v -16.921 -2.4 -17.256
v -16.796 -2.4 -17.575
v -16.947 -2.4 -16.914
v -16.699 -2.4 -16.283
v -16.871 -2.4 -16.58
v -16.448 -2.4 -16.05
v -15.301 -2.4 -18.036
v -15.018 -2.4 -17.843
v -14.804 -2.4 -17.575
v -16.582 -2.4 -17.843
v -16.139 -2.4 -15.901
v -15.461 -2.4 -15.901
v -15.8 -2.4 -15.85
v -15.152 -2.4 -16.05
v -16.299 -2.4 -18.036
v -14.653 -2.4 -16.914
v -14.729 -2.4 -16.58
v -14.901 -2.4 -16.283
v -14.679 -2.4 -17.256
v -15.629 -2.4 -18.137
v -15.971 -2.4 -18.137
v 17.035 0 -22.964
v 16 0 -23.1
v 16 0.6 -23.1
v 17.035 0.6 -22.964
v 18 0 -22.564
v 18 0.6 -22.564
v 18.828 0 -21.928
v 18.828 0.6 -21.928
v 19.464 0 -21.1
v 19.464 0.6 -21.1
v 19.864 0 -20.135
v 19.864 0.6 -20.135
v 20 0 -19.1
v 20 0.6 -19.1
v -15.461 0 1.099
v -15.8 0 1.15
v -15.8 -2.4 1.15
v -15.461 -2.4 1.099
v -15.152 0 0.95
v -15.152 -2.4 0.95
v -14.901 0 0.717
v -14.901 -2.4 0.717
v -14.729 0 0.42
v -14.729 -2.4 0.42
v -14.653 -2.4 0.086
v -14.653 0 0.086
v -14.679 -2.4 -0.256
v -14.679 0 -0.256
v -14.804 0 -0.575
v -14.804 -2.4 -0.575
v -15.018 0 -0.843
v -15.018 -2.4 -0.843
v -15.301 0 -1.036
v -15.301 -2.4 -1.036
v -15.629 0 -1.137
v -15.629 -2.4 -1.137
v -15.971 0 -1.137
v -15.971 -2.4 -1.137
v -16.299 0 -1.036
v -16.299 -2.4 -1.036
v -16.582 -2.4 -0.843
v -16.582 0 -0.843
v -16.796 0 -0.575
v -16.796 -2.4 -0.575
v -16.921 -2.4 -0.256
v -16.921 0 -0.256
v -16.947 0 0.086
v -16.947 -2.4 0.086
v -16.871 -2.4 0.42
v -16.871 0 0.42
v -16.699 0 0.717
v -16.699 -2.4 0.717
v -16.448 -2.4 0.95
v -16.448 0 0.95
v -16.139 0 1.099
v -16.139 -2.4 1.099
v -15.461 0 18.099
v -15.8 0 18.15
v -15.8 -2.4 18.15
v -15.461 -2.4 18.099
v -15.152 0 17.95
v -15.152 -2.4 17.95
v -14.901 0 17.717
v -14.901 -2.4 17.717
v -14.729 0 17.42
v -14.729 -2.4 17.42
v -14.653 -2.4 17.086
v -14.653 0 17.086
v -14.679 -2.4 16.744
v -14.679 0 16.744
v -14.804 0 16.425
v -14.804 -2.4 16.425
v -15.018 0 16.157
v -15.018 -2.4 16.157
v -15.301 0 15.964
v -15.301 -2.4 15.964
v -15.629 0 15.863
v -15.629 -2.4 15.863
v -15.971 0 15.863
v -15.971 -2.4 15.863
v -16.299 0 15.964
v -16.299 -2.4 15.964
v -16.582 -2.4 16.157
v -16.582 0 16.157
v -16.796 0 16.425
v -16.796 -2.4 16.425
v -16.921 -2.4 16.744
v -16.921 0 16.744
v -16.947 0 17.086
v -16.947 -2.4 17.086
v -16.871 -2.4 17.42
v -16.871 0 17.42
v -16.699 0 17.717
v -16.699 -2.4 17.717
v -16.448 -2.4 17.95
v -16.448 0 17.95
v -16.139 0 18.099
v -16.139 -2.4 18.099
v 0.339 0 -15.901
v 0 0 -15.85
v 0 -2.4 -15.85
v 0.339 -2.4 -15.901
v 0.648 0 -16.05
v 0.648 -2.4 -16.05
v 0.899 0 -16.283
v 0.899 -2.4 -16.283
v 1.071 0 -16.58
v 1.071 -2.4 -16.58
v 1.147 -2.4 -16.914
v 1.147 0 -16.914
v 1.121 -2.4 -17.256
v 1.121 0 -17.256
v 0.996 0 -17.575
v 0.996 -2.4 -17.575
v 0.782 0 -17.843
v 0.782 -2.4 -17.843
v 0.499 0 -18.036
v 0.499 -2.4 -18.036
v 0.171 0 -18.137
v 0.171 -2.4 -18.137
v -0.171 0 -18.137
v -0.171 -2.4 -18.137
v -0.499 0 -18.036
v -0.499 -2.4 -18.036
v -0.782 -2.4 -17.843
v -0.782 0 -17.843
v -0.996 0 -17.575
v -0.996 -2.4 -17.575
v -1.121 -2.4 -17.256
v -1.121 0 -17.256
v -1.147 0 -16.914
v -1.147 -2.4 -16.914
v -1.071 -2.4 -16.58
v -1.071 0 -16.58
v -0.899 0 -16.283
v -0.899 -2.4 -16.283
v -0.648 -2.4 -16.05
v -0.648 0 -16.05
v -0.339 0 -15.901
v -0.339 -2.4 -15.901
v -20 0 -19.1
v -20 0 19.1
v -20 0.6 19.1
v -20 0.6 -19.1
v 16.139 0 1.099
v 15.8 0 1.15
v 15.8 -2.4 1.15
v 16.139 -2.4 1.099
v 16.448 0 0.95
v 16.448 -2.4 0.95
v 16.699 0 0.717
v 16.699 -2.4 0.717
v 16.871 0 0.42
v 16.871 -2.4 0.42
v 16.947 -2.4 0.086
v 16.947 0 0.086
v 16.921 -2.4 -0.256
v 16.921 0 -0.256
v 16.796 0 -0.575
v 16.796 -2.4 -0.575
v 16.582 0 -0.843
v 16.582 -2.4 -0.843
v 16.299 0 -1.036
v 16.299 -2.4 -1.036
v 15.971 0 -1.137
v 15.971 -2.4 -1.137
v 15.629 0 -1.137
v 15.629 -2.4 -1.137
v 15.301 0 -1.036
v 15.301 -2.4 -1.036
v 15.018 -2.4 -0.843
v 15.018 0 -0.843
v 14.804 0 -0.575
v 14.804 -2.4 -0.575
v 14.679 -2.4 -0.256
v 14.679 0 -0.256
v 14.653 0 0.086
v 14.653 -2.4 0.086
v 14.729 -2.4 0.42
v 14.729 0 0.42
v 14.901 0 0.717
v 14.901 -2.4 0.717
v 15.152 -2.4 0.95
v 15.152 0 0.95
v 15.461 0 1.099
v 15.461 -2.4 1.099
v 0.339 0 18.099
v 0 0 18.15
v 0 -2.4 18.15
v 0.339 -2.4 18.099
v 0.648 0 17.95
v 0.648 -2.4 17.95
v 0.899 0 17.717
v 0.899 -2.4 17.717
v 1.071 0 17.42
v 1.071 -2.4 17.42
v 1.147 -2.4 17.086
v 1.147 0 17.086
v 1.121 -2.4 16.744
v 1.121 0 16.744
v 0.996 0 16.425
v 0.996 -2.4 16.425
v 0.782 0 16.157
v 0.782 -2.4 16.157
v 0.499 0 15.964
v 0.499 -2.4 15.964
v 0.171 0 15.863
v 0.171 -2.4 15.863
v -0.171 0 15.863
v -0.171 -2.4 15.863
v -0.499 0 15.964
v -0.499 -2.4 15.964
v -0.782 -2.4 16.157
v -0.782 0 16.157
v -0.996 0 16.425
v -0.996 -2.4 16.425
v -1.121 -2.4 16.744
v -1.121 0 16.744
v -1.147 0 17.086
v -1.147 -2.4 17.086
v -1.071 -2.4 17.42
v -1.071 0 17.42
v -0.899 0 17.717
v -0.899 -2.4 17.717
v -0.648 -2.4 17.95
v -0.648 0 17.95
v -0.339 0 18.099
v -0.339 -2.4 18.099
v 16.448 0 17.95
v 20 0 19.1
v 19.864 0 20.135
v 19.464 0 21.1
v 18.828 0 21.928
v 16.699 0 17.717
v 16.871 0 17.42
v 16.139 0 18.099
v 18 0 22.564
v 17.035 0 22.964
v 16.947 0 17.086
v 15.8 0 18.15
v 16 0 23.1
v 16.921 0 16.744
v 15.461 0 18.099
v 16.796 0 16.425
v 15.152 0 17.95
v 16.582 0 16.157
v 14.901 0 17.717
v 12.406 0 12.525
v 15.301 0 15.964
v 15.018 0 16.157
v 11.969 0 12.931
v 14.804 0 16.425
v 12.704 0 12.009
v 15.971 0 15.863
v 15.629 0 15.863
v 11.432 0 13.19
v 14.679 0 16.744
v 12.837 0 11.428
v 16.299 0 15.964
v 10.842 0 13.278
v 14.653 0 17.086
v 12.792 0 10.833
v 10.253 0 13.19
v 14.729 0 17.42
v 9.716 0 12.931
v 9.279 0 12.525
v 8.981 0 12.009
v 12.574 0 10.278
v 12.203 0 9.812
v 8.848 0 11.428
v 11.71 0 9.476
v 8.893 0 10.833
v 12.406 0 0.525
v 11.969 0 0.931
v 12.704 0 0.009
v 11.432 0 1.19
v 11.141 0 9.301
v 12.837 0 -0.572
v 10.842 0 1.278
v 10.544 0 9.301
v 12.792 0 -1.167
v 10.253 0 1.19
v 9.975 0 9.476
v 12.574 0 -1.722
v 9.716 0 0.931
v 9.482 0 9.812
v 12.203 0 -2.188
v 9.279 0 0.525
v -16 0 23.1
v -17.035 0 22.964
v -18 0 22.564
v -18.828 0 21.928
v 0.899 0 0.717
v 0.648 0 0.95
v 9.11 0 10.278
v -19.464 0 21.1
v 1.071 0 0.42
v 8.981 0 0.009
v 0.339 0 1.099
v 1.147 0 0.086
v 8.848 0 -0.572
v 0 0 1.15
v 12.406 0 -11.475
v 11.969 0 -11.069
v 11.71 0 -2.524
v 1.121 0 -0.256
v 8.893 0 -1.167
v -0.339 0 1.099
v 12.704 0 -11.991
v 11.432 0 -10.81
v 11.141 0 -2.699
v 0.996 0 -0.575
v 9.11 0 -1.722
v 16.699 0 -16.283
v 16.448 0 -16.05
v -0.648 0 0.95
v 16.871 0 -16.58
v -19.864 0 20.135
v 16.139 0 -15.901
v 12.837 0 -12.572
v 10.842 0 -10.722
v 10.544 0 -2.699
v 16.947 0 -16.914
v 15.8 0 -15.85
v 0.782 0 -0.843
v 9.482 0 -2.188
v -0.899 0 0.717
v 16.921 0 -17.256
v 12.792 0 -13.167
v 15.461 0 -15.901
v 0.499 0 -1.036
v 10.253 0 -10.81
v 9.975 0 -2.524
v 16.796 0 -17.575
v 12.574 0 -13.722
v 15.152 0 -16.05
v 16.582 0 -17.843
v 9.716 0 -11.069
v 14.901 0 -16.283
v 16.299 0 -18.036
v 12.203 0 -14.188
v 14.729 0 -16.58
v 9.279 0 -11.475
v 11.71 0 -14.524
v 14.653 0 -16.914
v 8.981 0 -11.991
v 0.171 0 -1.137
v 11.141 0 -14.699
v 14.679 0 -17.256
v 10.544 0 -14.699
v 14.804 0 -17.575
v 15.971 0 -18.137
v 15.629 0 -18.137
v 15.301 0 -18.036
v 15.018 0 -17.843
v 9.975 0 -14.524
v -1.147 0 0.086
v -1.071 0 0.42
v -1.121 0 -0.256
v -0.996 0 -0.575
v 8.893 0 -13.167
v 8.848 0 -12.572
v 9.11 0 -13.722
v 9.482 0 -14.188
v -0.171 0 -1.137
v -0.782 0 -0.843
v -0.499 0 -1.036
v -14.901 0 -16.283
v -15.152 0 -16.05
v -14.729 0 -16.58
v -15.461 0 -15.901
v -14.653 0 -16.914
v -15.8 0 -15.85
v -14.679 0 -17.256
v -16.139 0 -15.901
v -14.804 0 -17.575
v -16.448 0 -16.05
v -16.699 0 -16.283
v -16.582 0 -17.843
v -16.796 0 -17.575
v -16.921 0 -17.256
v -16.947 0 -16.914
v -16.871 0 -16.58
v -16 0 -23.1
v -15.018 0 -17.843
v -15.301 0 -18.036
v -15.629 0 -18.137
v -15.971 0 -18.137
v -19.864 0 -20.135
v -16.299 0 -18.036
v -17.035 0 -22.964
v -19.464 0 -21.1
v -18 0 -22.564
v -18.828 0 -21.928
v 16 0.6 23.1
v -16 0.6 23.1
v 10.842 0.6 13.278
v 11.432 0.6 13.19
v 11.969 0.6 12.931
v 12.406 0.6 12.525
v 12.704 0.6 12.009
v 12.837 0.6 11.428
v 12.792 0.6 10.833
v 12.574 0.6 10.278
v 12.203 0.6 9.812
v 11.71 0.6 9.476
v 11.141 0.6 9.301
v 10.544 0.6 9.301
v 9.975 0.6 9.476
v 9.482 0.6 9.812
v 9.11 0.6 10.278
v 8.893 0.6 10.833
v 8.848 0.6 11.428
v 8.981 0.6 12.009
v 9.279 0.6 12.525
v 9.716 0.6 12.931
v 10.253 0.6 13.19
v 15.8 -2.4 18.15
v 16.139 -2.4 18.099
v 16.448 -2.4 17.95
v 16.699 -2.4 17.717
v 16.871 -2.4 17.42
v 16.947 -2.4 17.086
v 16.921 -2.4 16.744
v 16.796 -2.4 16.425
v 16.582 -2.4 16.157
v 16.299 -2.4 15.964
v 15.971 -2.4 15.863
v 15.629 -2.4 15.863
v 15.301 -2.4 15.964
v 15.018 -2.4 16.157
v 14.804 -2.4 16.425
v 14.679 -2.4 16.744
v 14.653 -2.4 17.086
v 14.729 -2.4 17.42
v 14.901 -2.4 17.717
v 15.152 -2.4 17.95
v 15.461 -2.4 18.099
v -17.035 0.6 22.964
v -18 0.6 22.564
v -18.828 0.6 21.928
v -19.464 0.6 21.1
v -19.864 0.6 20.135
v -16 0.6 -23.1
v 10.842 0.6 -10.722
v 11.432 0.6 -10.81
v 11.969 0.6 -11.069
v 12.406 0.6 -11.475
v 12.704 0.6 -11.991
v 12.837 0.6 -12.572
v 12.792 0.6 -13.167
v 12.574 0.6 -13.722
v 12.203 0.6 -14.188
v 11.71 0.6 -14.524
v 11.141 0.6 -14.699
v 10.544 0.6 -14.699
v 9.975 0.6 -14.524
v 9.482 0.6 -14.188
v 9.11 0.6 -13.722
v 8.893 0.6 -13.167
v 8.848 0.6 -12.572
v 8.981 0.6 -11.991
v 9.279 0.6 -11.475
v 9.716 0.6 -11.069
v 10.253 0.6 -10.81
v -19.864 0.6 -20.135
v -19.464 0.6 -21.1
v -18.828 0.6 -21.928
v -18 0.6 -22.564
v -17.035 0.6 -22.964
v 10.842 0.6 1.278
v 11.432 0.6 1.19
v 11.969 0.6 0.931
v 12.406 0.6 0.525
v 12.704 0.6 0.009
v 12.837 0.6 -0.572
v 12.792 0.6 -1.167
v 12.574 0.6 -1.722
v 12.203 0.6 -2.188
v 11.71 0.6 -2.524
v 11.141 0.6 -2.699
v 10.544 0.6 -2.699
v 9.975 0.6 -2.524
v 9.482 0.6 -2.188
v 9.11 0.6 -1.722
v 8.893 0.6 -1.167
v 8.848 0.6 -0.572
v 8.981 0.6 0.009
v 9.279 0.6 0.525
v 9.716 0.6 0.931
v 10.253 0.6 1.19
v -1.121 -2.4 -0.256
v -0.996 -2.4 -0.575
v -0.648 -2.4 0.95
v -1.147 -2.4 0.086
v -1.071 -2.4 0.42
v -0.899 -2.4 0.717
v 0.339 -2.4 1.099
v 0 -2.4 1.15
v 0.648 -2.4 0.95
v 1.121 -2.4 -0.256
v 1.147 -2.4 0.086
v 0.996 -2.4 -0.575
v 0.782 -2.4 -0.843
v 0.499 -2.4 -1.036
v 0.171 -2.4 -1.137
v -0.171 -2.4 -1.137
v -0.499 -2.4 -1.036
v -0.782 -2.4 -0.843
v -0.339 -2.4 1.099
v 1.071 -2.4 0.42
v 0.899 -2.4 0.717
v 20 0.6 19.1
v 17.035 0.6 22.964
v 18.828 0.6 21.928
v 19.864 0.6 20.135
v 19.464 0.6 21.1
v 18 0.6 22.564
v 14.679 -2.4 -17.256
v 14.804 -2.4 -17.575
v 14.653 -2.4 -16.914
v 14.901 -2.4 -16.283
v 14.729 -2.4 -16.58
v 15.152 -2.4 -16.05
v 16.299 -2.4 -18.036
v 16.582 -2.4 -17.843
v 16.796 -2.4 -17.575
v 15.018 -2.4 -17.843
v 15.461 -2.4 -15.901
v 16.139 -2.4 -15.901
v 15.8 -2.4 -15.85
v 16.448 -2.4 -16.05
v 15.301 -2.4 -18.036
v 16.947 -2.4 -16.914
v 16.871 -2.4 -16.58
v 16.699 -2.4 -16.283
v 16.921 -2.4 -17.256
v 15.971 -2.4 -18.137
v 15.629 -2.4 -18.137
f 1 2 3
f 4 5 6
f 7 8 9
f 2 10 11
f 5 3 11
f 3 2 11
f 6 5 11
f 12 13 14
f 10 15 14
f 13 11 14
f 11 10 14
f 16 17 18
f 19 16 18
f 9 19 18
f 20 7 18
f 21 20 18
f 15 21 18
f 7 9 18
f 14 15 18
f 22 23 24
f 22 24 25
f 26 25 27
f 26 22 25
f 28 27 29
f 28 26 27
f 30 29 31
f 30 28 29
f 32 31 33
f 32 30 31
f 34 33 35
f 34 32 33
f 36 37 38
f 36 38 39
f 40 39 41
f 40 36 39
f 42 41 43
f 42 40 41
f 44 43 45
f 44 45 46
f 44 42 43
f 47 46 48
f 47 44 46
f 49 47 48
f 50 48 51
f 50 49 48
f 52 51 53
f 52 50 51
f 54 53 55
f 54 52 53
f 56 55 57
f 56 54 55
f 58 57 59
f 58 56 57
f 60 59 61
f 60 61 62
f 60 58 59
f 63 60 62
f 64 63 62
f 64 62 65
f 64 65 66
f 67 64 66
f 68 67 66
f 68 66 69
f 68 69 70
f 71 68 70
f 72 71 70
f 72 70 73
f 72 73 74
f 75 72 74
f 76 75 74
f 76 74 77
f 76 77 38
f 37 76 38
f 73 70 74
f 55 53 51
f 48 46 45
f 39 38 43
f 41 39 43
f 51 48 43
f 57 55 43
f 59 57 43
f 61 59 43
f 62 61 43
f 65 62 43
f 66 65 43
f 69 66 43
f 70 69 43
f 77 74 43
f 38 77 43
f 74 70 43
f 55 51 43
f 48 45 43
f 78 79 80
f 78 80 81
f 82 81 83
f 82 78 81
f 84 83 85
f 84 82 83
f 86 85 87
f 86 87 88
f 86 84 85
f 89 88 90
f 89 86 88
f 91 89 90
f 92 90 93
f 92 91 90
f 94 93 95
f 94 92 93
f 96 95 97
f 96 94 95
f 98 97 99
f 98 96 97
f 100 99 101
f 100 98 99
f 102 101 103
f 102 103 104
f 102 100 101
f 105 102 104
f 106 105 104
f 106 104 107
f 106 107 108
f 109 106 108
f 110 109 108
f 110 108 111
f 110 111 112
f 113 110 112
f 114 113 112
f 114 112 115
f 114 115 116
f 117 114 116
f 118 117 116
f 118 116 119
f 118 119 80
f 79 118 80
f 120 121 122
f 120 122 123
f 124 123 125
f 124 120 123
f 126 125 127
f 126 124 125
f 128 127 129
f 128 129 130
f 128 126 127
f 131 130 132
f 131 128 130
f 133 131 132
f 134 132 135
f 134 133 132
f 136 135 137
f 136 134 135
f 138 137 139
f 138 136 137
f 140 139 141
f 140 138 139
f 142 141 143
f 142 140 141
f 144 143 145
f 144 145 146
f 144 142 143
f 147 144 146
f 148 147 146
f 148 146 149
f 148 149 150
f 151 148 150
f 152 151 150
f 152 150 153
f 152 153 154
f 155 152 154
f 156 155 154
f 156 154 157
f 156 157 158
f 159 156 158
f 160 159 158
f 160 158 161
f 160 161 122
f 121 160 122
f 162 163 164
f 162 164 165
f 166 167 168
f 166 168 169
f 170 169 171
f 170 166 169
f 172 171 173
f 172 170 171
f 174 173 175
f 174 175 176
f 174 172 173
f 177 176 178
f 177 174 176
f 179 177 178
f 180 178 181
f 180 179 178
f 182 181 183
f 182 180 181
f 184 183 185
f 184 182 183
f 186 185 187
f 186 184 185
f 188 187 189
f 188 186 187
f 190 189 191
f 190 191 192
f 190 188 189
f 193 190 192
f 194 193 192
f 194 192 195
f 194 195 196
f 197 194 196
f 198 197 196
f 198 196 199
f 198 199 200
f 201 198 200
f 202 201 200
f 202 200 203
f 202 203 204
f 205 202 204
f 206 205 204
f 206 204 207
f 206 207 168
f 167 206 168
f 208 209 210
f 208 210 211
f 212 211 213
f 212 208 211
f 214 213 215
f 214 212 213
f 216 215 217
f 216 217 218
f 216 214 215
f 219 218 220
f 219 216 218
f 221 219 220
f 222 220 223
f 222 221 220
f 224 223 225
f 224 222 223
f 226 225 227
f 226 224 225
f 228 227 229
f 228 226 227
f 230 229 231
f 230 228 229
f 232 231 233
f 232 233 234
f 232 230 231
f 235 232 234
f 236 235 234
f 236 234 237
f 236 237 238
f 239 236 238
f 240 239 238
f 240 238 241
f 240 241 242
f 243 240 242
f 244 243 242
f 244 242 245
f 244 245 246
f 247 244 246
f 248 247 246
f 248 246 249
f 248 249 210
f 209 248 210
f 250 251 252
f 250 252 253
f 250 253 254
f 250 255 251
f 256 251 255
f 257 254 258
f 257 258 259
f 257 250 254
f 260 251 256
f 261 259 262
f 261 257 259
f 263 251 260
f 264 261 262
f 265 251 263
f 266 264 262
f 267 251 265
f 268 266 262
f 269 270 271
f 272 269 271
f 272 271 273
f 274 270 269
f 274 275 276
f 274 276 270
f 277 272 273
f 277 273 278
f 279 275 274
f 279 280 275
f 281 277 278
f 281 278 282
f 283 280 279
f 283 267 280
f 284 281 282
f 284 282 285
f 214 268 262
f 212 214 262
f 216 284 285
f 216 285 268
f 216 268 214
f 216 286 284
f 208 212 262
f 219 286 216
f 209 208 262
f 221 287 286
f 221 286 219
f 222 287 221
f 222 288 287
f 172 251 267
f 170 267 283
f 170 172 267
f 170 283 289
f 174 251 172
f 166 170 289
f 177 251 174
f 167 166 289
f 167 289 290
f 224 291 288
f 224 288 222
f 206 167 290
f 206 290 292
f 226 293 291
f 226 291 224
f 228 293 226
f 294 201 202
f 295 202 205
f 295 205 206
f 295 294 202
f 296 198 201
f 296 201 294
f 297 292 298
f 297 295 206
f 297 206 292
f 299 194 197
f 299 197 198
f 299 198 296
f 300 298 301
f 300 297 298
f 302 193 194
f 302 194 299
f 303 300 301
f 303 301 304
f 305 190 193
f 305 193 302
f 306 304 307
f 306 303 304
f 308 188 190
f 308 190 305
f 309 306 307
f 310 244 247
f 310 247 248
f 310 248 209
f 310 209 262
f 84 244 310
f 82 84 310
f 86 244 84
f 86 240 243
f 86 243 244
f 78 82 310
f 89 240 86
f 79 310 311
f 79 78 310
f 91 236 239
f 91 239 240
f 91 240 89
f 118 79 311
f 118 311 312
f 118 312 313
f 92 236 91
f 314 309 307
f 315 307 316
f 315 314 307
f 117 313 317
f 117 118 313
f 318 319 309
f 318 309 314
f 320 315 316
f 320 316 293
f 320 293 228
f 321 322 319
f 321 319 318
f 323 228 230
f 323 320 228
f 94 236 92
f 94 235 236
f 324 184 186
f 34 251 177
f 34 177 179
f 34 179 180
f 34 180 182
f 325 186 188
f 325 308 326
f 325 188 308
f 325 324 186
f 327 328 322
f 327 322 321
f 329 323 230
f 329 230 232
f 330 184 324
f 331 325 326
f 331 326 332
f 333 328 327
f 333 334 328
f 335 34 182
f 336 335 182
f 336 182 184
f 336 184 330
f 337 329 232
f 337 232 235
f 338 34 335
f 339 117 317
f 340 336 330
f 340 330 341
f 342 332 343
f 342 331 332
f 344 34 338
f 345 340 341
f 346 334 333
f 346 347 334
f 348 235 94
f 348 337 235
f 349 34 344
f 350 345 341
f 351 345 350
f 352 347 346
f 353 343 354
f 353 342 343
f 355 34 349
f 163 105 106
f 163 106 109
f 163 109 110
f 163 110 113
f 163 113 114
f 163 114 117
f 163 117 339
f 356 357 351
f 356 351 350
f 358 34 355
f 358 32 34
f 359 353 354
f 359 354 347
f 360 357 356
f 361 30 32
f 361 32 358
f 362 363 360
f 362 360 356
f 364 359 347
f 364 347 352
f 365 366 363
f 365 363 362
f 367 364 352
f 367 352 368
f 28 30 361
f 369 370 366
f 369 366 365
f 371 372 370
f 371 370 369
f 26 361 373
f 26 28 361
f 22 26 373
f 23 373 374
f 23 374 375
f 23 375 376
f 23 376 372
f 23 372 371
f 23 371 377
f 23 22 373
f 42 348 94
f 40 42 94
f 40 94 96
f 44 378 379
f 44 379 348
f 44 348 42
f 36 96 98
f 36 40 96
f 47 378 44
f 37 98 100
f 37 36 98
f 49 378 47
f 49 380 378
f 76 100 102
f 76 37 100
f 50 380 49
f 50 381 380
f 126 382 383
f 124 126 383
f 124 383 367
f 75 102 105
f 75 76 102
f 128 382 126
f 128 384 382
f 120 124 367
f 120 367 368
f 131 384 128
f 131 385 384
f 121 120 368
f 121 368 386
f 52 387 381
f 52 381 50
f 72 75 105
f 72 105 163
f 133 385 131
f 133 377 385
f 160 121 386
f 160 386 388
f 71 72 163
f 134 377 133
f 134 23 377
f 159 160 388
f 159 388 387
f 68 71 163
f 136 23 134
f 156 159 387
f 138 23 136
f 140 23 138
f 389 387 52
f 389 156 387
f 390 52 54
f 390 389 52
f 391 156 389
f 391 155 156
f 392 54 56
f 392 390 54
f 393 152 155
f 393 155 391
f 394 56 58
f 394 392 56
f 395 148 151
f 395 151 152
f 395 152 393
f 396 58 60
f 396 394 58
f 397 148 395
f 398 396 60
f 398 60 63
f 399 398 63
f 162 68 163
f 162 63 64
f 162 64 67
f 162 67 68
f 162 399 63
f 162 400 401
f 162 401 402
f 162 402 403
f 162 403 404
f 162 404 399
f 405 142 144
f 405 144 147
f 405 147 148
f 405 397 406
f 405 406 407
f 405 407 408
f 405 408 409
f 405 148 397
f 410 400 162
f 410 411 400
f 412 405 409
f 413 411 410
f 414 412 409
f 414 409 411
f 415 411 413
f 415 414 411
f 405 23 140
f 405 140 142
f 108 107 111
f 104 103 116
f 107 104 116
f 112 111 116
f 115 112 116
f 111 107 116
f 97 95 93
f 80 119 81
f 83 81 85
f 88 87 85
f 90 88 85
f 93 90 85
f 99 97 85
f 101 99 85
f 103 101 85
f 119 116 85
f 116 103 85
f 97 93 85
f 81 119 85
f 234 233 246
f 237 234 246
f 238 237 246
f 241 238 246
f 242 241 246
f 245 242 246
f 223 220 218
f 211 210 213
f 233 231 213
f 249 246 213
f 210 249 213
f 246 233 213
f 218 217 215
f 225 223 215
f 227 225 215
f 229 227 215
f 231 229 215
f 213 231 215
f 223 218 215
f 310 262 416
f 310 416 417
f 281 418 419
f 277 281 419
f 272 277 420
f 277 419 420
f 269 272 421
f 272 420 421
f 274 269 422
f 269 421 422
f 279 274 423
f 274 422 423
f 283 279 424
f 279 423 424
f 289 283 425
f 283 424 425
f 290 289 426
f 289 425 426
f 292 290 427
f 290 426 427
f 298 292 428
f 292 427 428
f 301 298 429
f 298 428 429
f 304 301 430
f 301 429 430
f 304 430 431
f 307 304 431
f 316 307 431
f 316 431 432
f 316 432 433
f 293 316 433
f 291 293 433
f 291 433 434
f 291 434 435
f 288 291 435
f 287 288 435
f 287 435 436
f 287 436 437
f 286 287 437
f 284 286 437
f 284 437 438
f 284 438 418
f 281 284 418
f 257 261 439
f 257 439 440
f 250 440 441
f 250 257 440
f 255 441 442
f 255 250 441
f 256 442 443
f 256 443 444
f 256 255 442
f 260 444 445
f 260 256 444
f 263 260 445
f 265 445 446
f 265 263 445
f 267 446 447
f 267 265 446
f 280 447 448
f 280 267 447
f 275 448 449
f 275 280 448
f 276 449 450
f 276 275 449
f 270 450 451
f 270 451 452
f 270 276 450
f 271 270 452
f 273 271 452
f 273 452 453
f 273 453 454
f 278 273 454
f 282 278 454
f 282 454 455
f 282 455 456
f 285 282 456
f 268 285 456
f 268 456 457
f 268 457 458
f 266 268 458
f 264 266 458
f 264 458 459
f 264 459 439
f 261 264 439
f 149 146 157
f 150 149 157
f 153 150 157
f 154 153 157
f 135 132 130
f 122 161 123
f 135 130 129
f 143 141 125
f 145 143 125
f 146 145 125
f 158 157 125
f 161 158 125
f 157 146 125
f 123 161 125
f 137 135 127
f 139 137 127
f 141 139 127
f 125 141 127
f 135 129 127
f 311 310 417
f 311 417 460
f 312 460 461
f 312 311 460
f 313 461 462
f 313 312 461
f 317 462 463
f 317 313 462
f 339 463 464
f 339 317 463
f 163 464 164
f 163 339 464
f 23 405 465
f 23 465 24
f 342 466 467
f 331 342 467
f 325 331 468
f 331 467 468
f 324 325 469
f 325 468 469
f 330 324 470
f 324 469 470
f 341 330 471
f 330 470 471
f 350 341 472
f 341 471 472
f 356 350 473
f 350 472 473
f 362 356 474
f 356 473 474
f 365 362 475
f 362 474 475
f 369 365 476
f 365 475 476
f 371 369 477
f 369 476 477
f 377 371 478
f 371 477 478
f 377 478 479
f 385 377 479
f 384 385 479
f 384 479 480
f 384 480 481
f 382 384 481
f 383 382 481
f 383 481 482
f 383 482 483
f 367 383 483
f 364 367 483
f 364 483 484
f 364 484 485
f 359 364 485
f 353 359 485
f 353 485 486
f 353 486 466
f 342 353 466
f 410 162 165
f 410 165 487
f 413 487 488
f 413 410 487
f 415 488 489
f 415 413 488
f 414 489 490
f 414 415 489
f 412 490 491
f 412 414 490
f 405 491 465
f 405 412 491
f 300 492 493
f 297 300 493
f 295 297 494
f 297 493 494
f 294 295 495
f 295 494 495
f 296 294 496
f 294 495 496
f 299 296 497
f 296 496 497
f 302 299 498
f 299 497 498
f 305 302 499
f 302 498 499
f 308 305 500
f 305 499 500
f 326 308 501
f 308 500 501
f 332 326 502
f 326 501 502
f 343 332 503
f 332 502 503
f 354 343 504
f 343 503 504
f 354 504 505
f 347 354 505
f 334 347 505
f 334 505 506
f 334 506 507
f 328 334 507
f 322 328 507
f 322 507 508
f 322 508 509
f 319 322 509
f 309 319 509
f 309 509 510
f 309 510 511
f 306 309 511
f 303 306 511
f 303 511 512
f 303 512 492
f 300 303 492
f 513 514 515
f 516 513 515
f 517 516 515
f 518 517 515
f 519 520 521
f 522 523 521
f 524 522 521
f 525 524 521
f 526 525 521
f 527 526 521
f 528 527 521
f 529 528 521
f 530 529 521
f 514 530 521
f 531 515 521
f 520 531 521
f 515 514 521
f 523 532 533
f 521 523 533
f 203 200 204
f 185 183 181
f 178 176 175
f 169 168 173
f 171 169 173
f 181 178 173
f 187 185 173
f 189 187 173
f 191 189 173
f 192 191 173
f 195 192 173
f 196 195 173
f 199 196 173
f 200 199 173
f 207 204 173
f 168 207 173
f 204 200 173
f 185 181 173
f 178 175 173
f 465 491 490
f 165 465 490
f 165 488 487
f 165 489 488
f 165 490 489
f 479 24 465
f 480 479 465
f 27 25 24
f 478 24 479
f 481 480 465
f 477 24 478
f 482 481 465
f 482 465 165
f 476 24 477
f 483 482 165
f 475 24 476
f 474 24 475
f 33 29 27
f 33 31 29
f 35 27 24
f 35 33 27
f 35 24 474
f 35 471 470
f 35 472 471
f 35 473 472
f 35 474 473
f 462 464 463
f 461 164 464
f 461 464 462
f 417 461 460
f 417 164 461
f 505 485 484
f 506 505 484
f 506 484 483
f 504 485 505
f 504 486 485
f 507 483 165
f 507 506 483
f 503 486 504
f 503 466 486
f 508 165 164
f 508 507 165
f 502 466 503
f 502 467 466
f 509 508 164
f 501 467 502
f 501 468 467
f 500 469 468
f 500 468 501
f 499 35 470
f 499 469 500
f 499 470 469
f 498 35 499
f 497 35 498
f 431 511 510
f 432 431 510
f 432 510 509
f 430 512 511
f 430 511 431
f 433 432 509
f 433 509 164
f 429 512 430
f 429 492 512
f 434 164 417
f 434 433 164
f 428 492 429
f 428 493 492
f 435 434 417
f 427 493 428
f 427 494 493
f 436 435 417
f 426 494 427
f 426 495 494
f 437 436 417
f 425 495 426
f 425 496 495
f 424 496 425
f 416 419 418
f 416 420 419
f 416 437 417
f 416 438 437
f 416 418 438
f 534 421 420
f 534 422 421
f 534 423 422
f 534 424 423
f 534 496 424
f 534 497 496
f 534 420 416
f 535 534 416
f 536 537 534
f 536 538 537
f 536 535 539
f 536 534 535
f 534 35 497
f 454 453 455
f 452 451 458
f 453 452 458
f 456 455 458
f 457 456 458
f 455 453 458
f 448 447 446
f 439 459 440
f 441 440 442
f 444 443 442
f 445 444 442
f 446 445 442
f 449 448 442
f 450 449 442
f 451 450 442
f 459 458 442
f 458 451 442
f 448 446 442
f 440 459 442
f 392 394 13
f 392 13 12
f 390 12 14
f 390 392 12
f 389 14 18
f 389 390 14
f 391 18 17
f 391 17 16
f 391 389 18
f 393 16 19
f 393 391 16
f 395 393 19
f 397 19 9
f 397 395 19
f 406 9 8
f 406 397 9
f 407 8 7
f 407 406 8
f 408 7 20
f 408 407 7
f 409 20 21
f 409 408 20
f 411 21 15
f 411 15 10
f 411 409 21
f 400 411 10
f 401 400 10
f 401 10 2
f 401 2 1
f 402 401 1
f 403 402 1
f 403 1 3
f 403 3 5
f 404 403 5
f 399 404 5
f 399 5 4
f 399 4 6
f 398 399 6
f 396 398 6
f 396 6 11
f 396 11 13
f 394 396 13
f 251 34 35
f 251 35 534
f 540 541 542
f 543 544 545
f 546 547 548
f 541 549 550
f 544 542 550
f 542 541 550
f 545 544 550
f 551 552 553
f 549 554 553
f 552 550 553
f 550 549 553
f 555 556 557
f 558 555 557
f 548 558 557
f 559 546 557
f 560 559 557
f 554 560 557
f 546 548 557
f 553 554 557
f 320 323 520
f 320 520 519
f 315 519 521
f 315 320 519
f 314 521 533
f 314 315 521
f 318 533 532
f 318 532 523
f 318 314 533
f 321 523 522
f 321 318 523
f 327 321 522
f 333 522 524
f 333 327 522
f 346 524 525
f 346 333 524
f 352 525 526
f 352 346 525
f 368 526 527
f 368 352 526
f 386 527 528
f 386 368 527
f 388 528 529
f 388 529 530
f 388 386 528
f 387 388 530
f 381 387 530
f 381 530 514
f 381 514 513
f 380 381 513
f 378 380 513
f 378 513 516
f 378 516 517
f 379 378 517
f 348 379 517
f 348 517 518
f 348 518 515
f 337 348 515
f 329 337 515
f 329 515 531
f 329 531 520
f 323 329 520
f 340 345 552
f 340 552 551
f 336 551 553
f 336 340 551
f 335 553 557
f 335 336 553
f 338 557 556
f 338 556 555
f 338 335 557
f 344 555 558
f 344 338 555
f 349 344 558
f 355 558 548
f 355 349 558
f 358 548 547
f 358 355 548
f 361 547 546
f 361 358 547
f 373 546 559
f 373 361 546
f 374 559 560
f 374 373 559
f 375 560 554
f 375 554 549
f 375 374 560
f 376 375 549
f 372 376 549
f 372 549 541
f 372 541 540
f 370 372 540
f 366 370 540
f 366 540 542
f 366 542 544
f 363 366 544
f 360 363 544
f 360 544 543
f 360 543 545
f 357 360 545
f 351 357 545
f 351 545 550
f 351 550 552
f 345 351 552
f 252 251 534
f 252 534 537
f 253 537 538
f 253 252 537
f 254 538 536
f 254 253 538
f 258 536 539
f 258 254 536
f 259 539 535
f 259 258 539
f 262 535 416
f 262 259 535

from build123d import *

# Parameters (mm, degrees)
BOSS_EXTRUDE1_DEPTH = 0.6
SKETCH3_R           = 2
CUT_EXTRUDE1_DEPTH  = 10
SKETCH4_R           = 1.15
BOSS_EXTRUDE3_DEPTH = 3


with BuildPart() as part:
    # Sketch2 → Boss-Extrude1 (new body)
    with BuildSketch(Plane(origin=(0, 0, 0), x_dir=(1, 0, 0), z_dir=(0, 1, 0))):
        with BuildLine():
            Line((-16, 23.1), (16, 23.1))
            ThreePointArc((16, 23.1), (18.828427125, 21.928427125), (20, 19.1))
            Line((20, 19.1), (20, -19.1))
            ThreePointArc((20, -19.1), (18.828427125, -21.928427125), (16, -23.1))
            Line((16, -23.1), (-16, -23.1))
            ThreePointArc((-16, -23.1), (-18.828427125, -21.928427125), (-20, -19.1))
            Line((-20, -19.1), (-20, 19.1))
            ThreePointArc((-20, 19.1), (-18.828427125, 21.928427125), (-16, 23.1))
        make_face()
    extrude(amount=BOSS_EXTRUDE1_DEPTH)

    # Sketch3 → Cut-Extrude1 (cut)
    with BuildSketch(Plane(origin=(0, 0.6, 0), x_dir=(1, 0, 0), z_dir=(0, 1, 0))):
        with Locations(Location((10.84244602, -11.278395934, 0), (0, 0, 270))):
            Circle(SKETCH3_R)
        with Locations(Location((10.84244602, 0.721604066, 0), (0, 0, 270))):
            Circle(SKETCH3_R)
        with Locations(Location((10.84244602, 12.721604066, 0), (0, 0, 270))):
            Circle(SKETCH3_R)
    extrude(amount=-CUT_EXTRUDE1_DEPTH, mode=Mode.SUBTRACT)

    # Sketch4 → Boss-Extrude3 (add)
    with BuildSketch(Plane(origin=(0, 0.6, 0), x_dir=(1, 0, 0), z_dir=(0, 1, 0))):
        with Locations(Location((15.8, 17, 0), (0, 0, 270))):
            Circle(SKETCH4_R)
        with Locations(Location((0, 17, 0), (0, 0, 270))):
            Circle(SKETCH4_R)
        with Locations(Location((-15.8, 17, 0), (0, 0, 270))):
            Circle(SKETCH4_R)
        with Locations(Location((0, 0, 0), (0, 0, 270))):
            Circle(SKETCH4_R)
        with Locations(Location((-15.8, 0, 0), (0, 0, 270))):
            Circle(SKETCH4_R)
        with Locations(Location((0, -17, 0), (0, 0, 270))):
            Circle(SKETCH4_R)
        with Locations(Location((-15.8, -17, 0), (0, 0, 270))):
            Circle(SKETCH4_R)
        with Locations(Location((15.8, 0, 0), (0, 0, 270))):
            Circle(SKETCH4_R)
        with Locations(Location((15.8, -17, 0), (0, 0, 270))):
            Circle(SKETCH4_R)
    extrude(amount=-BOSS_EXTRUDE3_DEPTH)


solid = part.part
